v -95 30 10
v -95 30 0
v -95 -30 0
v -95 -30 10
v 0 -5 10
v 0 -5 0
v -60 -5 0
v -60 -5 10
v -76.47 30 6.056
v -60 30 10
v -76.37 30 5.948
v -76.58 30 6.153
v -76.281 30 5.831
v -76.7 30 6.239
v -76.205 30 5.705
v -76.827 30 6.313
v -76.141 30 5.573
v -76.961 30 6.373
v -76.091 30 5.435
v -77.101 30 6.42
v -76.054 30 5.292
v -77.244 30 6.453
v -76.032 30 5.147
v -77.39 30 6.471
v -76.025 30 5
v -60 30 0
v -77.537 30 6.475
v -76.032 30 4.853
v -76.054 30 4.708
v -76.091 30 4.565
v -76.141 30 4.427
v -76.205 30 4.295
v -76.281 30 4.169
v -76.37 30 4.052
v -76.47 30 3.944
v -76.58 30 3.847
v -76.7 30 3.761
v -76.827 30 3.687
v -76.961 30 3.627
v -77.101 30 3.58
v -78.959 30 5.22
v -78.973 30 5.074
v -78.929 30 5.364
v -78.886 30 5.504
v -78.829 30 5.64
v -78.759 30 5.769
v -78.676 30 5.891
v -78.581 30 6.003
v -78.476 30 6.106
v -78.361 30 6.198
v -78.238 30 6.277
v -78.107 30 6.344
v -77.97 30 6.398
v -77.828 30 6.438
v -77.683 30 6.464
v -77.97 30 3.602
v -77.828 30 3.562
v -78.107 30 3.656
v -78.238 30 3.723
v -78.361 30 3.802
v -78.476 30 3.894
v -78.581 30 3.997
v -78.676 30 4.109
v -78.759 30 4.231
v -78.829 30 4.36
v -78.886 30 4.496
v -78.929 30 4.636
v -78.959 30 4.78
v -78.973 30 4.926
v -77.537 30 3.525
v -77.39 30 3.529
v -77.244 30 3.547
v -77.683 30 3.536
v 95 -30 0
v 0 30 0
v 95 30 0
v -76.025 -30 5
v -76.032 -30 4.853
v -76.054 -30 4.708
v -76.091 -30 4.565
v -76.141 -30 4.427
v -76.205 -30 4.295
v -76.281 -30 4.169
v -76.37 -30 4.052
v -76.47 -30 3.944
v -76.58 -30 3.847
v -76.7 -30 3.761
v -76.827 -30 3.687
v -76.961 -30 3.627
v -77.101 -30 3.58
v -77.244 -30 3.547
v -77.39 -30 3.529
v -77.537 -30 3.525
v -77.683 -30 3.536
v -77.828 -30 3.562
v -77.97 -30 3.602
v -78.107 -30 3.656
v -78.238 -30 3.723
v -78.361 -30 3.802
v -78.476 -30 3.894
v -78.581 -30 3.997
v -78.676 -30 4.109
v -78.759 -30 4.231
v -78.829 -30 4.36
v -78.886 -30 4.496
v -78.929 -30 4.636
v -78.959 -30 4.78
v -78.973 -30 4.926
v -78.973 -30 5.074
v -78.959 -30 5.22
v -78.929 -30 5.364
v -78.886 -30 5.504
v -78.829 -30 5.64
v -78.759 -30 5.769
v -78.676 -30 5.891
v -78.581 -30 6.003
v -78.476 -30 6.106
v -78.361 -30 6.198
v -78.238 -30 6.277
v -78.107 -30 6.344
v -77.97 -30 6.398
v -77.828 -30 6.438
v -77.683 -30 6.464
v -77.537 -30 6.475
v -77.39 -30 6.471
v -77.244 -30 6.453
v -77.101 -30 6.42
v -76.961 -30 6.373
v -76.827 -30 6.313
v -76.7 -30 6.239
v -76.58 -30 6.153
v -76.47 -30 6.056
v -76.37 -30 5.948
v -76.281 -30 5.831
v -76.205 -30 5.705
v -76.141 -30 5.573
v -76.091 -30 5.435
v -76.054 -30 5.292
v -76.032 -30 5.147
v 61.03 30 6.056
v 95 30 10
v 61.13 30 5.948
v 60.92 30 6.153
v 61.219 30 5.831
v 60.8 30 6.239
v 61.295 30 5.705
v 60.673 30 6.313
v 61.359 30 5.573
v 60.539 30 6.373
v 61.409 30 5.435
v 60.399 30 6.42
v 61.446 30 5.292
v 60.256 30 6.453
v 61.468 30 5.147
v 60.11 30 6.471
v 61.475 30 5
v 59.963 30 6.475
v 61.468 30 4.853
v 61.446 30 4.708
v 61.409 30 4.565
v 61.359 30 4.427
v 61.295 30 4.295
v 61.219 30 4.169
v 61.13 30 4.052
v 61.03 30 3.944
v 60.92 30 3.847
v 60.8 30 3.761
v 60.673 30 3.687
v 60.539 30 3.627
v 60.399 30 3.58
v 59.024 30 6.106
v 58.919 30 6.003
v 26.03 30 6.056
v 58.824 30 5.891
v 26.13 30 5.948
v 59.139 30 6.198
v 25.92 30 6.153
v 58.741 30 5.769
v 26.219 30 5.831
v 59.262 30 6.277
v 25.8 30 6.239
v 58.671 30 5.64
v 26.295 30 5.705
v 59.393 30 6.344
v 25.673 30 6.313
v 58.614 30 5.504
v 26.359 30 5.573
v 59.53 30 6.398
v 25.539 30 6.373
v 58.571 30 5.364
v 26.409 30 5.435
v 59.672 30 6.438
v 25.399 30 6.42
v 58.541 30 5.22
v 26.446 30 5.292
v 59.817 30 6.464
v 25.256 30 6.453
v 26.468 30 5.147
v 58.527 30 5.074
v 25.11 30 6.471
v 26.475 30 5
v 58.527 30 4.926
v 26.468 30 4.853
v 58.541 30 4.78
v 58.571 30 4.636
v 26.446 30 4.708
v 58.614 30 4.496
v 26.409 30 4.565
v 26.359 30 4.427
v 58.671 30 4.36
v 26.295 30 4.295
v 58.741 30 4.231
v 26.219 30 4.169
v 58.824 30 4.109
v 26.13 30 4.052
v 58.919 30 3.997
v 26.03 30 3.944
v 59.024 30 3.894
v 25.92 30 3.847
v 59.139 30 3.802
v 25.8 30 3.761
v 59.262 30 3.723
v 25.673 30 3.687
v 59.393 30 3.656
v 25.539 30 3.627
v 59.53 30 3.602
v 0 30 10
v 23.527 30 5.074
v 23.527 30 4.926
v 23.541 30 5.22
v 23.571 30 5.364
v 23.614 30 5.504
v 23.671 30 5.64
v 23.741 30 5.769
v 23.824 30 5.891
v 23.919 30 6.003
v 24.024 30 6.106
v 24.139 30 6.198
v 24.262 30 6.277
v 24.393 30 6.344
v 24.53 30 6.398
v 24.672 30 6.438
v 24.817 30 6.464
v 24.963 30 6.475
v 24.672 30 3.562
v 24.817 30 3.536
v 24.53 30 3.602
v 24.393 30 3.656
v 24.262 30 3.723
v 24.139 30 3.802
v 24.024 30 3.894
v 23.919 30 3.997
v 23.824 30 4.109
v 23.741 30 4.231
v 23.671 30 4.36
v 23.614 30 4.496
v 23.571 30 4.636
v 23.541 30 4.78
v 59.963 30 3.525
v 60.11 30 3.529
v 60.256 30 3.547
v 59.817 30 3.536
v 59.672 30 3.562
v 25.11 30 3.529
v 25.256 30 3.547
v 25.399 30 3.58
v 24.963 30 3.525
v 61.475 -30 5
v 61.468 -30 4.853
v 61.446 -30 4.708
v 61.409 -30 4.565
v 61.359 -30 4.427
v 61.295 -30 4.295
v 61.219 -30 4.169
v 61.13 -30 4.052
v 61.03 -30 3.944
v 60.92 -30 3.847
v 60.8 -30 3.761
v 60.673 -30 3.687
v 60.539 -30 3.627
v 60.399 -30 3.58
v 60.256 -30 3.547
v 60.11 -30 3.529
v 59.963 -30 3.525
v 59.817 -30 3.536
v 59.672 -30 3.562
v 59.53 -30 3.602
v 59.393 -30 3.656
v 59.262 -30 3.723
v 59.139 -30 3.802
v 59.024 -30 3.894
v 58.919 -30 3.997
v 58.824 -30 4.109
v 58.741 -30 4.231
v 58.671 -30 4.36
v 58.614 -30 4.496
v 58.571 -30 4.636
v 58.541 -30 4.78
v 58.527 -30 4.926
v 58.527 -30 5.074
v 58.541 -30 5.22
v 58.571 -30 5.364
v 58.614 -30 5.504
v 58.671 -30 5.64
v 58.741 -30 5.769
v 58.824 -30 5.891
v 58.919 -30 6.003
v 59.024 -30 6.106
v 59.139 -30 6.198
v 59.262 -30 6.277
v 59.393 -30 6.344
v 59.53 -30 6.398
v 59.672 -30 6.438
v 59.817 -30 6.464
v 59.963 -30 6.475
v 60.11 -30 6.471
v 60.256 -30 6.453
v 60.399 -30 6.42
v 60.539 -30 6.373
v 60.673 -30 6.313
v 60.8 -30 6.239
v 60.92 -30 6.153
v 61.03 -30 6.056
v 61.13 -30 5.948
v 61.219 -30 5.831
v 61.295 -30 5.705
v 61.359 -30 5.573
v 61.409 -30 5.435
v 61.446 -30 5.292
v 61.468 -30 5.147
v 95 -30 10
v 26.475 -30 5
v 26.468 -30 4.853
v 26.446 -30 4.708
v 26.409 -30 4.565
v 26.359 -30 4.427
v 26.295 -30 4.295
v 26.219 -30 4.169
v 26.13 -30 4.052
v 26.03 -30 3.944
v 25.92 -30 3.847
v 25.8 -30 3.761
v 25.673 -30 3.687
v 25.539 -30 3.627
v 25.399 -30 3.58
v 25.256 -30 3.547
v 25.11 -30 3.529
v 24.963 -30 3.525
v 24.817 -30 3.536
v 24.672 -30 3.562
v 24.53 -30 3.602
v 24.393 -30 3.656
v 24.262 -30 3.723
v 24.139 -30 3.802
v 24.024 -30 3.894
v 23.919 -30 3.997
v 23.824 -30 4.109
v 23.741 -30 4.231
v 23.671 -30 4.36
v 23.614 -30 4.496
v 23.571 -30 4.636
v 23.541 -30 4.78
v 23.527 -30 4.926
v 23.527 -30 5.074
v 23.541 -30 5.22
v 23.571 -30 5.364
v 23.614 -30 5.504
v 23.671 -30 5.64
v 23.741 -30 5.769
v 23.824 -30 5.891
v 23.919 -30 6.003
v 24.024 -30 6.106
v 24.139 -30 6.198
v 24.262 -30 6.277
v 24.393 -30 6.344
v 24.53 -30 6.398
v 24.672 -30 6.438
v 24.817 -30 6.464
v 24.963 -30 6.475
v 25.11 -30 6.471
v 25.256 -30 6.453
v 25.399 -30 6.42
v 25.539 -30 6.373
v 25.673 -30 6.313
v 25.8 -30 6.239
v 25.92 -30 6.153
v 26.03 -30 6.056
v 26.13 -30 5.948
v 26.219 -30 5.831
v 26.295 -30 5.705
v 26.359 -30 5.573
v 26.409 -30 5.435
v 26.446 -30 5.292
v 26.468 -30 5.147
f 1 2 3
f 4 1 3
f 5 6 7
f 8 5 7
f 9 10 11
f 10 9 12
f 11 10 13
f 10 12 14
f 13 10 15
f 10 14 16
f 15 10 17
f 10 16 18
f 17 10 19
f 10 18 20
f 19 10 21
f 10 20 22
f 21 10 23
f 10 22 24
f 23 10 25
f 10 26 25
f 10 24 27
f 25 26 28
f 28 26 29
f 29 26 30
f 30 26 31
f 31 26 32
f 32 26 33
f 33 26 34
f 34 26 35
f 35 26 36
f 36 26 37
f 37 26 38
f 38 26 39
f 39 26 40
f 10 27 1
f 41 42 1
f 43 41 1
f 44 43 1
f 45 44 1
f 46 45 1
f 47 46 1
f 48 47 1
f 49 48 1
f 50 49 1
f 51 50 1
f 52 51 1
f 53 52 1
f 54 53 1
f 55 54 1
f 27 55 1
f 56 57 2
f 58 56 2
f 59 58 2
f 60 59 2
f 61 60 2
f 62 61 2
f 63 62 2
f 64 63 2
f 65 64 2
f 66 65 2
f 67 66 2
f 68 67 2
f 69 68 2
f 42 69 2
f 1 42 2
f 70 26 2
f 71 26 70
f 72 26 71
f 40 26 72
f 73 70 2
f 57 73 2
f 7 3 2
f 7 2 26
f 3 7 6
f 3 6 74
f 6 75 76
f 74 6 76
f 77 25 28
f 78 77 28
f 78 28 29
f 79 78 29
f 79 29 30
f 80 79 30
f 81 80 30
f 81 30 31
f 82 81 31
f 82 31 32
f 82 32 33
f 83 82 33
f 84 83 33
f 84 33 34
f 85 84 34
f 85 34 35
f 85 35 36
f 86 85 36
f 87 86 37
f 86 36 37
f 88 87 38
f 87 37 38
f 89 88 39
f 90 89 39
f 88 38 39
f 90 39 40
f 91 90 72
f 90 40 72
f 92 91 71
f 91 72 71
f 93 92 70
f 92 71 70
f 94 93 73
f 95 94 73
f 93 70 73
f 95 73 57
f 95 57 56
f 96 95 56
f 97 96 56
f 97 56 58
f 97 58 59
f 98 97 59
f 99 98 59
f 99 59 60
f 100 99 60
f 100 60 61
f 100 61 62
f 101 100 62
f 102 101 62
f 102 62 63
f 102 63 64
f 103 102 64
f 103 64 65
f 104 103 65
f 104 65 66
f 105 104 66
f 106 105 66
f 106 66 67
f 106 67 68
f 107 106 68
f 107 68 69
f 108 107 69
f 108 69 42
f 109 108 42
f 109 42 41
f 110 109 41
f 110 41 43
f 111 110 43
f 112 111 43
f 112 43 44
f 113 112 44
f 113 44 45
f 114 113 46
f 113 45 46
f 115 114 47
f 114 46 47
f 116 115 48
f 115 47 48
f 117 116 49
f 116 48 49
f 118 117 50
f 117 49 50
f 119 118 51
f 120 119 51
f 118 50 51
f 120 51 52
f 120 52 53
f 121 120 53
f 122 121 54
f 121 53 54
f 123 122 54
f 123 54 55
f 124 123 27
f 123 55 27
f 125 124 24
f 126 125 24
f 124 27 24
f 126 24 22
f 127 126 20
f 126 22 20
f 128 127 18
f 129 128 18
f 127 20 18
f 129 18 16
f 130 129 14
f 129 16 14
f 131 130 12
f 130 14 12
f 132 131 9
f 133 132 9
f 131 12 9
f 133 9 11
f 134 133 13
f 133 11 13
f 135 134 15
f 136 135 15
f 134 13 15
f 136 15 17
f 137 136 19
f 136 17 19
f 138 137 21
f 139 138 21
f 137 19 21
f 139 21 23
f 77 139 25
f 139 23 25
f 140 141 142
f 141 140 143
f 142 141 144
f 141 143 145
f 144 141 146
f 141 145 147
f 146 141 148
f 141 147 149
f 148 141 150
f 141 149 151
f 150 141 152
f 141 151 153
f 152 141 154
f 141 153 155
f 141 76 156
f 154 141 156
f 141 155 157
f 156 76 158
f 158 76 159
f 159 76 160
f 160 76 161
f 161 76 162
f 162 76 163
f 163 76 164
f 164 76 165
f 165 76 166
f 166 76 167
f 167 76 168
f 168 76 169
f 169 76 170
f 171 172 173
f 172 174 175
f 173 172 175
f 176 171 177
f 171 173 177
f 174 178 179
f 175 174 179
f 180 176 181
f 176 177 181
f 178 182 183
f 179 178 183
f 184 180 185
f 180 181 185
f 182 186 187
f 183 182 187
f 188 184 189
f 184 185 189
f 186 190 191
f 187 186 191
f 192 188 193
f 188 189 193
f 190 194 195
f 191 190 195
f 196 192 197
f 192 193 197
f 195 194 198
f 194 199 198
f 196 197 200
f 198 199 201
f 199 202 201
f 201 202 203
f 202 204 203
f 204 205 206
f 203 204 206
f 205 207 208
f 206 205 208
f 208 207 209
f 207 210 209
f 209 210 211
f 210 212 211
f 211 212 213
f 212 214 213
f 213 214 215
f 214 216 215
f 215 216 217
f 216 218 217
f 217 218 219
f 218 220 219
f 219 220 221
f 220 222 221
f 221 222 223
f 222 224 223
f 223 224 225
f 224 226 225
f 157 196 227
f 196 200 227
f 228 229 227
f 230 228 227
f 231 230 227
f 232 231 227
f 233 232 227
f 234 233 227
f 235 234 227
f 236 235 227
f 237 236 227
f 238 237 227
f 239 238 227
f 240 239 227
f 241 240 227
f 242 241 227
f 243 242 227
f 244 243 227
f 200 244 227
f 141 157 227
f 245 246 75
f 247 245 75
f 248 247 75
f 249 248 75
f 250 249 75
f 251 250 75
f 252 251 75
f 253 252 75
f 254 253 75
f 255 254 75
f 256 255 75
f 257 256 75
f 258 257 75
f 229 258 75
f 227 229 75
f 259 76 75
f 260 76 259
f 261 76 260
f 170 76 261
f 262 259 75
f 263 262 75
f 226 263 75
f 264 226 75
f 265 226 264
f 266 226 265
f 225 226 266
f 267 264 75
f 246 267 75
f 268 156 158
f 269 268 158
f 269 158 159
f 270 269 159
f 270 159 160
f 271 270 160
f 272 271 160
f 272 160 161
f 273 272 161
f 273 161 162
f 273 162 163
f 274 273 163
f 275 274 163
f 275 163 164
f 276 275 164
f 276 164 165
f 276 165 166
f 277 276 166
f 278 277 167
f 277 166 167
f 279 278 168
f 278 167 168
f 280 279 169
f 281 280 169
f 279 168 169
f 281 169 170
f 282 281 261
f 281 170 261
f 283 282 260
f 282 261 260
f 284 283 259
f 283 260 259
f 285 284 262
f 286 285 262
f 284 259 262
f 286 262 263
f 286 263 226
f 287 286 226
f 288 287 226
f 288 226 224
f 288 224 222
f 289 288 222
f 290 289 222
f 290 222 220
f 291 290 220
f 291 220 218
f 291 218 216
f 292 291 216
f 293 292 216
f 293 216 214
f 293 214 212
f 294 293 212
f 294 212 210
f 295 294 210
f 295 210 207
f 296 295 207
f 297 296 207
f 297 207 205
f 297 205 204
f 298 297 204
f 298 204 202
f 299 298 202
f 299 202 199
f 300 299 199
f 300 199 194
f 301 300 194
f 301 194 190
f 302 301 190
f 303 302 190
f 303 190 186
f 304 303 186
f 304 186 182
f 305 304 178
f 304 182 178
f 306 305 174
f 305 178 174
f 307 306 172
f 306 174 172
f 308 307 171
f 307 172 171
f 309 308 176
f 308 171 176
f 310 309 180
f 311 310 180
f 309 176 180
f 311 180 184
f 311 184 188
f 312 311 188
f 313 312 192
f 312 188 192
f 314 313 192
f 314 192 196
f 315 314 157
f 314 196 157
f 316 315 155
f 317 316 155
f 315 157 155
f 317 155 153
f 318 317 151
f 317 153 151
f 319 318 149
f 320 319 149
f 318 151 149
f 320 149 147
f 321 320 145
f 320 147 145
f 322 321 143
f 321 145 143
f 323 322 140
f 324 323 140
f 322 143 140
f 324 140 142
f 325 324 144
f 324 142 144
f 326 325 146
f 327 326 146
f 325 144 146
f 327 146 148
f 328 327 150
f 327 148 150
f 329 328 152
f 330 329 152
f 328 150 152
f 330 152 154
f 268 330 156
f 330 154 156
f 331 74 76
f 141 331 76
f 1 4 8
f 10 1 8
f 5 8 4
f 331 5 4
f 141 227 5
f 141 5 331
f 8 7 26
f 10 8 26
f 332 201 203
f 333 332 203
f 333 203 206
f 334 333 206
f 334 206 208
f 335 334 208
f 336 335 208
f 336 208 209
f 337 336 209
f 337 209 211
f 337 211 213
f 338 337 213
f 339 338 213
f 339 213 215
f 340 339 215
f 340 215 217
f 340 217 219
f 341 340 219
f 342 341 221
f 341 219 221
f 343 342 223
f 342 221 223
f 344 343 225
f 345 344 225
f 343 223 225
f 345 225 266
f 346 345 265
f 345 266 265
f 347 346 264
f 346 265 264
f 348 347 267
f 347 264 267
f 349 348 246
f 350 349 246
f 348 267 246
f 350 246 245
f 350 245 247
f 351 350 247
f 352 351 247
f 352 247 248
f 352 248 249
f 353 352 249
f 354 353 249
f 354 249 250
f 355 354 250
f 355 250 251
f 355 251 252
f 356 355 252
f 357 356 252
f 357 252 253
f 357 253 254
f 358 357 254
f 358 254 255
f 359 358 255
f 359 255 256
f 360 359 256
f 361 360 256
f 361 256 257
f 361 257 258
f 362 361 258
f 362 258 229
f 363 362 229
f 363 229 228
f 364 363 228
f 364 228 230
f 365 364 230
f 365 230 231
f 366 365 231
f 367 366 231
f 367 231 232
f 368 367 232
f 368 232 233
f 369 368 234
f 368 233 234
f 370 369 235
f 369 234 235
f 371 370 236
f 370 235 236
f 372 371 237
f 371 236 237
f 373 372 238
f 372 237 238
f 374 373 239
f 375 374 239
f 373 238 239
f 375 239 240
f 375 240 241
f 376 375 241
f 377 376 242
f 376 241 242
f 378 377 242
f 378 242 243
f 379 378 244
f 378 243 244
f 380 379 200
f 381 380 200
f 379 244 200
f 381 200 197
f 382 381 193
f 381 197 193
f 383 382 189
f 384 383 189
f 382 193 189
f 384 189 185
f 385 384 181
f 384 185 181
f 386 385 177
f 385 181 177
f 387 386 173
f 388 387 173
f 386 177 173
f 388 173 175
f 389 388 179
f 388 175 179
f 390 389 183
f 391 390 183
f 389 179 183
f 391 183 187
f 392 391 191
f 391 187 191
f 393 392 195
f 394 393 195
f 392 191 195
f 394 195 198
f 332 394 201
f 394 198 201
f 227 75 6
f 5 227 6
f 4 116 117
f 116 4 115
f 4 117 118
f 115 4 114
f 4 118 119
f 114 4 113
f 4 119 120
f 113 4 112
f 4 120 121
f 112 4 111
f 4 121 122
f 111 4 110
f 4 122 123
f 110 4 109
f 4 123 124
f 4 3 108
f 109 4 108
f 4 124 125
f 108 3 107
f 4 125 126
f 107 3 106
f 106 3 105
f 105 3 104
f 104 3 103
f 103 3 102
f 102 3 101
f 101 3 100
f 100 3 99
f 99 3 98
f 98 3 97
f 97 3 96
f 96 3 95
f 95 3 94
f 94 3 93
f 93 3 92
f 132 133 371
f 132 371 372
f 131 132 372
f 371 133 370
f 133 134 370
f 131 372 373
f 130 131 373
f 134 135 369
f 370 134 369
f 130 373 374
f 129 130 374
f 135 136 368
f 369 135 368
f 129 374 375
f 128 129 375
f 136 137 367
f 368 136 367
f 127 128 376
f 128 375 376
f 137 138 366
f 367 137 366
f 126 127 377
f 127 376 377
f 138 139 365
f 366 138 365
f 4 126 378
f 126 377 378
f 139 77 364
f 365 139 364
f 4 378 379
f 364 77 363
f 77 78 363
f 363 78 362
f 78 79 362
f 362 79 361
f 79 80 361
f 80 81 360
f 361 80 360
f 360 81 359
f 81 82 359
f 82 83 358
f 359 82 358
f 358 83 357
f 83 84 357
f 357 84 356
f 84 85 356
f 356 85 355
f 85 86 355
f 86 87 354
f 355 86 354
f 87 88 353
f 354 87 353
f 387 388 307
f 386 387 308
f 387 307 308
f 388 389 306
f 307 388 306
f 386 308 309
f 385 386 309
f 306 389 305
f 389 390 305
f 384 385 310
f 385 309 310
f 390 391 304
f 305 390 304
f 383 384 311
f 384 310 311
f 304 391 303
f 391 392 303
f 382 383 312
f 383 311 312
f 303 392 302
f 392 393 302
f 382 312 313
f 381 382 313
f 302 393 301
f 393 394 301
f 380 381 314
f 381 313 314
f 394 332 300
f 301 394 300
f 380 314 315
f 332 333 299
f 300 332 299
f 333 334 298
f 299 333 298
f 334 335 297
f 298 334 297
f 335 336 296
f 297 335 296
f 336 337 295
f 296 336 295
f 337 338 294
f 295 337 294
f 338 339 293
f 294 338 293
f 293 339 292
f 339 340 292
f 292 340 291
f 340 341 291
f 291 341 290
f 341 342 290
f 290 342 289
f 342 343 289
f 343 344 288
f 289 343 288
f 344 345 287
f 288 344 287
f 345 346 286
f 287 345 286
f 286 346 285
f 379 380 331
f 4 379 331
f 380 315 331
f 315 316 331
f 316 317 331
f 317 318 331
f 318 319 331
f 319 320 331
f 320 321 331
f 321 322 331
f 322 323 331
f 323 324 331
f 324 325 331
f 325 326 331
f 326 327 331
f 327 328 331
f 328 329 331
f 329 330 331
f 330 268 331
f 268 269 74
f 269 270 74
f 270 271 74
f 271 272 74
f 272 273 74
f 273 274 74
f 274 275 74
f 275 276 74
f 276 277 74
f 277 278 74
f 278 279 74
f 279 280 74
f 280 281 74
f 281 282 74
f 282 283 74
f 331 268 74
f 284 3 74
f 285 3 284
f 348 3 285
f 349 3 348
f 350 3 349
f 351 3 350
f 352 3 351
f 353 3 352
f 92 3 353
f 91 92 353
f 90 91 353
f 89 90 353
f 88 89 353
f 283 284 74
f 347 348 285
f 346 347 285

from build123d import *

# Parameters (mm, degrees)
BOSS_EXTRUDE1_DEPTH = 10
CUT_EXTRUDE1_DEPTH  = 61


with BuildPart() as part:
    # Sketch2 → Boss-Extrude1 (new body)
    with BuildSketch(Plane.XY):
        Polygon((-60, 30), (-95, 30), (-95, -30), (95, -30), (95, 30), (0, 30), (0, -5), (-60, -5), align=None)
    extrude(amount=BOSS_EXTRUDE1_DEPTH)

    # Sketch3 → Cut-Extrude1 (cut, through all)
    with BuildSketch(Plane(origin=(0, 30, 0), x_dir=(1, 0, 0), z_dir=(0, 1, 0))):
        with BuildLine():
            ThreePointArc((-78.975, -5), (-77.5, -6.475), (-76.025, -5))
            Line((-76.025, -5), (-78.975, -5))
        make_face()
        with BuildLine():
            Line((-78.975, -5), (-76.025, -5))
            ThreePointArc((-76.025, -5), (-77.5, -3.525), (-78.975, -5))
        make_face()
        with BuildLine():
            ThreePointArc((58.525, -5), (60, -6.475), (61.475, -5))
            Line((61.475, -5), (58.525, -5))
        make_face()
        with BuildLine():
            Line((58.525, -5), (61.475, -5))
            ThreePointArc((61.475, -5), (60, -3.525), (58.525, -5))
        make_face()
        with BuildLine():
            ThreePointArc((23.525, -5), (25, -6.475), (26.475, -5))
            Line((26.475, -5), (23.525, -5))
        make_face()
        with BuildLine():
            Line((23.525, -5), (26.475, -5))
            ThreePointArc((26.475, -5), (25, -3.525), (23.525, -5))
        make_face()
    extrude(amount=-CUT_EXTRUDE1_DEPTH, mode=Mode.SUBTRACT)


solid = part.part
